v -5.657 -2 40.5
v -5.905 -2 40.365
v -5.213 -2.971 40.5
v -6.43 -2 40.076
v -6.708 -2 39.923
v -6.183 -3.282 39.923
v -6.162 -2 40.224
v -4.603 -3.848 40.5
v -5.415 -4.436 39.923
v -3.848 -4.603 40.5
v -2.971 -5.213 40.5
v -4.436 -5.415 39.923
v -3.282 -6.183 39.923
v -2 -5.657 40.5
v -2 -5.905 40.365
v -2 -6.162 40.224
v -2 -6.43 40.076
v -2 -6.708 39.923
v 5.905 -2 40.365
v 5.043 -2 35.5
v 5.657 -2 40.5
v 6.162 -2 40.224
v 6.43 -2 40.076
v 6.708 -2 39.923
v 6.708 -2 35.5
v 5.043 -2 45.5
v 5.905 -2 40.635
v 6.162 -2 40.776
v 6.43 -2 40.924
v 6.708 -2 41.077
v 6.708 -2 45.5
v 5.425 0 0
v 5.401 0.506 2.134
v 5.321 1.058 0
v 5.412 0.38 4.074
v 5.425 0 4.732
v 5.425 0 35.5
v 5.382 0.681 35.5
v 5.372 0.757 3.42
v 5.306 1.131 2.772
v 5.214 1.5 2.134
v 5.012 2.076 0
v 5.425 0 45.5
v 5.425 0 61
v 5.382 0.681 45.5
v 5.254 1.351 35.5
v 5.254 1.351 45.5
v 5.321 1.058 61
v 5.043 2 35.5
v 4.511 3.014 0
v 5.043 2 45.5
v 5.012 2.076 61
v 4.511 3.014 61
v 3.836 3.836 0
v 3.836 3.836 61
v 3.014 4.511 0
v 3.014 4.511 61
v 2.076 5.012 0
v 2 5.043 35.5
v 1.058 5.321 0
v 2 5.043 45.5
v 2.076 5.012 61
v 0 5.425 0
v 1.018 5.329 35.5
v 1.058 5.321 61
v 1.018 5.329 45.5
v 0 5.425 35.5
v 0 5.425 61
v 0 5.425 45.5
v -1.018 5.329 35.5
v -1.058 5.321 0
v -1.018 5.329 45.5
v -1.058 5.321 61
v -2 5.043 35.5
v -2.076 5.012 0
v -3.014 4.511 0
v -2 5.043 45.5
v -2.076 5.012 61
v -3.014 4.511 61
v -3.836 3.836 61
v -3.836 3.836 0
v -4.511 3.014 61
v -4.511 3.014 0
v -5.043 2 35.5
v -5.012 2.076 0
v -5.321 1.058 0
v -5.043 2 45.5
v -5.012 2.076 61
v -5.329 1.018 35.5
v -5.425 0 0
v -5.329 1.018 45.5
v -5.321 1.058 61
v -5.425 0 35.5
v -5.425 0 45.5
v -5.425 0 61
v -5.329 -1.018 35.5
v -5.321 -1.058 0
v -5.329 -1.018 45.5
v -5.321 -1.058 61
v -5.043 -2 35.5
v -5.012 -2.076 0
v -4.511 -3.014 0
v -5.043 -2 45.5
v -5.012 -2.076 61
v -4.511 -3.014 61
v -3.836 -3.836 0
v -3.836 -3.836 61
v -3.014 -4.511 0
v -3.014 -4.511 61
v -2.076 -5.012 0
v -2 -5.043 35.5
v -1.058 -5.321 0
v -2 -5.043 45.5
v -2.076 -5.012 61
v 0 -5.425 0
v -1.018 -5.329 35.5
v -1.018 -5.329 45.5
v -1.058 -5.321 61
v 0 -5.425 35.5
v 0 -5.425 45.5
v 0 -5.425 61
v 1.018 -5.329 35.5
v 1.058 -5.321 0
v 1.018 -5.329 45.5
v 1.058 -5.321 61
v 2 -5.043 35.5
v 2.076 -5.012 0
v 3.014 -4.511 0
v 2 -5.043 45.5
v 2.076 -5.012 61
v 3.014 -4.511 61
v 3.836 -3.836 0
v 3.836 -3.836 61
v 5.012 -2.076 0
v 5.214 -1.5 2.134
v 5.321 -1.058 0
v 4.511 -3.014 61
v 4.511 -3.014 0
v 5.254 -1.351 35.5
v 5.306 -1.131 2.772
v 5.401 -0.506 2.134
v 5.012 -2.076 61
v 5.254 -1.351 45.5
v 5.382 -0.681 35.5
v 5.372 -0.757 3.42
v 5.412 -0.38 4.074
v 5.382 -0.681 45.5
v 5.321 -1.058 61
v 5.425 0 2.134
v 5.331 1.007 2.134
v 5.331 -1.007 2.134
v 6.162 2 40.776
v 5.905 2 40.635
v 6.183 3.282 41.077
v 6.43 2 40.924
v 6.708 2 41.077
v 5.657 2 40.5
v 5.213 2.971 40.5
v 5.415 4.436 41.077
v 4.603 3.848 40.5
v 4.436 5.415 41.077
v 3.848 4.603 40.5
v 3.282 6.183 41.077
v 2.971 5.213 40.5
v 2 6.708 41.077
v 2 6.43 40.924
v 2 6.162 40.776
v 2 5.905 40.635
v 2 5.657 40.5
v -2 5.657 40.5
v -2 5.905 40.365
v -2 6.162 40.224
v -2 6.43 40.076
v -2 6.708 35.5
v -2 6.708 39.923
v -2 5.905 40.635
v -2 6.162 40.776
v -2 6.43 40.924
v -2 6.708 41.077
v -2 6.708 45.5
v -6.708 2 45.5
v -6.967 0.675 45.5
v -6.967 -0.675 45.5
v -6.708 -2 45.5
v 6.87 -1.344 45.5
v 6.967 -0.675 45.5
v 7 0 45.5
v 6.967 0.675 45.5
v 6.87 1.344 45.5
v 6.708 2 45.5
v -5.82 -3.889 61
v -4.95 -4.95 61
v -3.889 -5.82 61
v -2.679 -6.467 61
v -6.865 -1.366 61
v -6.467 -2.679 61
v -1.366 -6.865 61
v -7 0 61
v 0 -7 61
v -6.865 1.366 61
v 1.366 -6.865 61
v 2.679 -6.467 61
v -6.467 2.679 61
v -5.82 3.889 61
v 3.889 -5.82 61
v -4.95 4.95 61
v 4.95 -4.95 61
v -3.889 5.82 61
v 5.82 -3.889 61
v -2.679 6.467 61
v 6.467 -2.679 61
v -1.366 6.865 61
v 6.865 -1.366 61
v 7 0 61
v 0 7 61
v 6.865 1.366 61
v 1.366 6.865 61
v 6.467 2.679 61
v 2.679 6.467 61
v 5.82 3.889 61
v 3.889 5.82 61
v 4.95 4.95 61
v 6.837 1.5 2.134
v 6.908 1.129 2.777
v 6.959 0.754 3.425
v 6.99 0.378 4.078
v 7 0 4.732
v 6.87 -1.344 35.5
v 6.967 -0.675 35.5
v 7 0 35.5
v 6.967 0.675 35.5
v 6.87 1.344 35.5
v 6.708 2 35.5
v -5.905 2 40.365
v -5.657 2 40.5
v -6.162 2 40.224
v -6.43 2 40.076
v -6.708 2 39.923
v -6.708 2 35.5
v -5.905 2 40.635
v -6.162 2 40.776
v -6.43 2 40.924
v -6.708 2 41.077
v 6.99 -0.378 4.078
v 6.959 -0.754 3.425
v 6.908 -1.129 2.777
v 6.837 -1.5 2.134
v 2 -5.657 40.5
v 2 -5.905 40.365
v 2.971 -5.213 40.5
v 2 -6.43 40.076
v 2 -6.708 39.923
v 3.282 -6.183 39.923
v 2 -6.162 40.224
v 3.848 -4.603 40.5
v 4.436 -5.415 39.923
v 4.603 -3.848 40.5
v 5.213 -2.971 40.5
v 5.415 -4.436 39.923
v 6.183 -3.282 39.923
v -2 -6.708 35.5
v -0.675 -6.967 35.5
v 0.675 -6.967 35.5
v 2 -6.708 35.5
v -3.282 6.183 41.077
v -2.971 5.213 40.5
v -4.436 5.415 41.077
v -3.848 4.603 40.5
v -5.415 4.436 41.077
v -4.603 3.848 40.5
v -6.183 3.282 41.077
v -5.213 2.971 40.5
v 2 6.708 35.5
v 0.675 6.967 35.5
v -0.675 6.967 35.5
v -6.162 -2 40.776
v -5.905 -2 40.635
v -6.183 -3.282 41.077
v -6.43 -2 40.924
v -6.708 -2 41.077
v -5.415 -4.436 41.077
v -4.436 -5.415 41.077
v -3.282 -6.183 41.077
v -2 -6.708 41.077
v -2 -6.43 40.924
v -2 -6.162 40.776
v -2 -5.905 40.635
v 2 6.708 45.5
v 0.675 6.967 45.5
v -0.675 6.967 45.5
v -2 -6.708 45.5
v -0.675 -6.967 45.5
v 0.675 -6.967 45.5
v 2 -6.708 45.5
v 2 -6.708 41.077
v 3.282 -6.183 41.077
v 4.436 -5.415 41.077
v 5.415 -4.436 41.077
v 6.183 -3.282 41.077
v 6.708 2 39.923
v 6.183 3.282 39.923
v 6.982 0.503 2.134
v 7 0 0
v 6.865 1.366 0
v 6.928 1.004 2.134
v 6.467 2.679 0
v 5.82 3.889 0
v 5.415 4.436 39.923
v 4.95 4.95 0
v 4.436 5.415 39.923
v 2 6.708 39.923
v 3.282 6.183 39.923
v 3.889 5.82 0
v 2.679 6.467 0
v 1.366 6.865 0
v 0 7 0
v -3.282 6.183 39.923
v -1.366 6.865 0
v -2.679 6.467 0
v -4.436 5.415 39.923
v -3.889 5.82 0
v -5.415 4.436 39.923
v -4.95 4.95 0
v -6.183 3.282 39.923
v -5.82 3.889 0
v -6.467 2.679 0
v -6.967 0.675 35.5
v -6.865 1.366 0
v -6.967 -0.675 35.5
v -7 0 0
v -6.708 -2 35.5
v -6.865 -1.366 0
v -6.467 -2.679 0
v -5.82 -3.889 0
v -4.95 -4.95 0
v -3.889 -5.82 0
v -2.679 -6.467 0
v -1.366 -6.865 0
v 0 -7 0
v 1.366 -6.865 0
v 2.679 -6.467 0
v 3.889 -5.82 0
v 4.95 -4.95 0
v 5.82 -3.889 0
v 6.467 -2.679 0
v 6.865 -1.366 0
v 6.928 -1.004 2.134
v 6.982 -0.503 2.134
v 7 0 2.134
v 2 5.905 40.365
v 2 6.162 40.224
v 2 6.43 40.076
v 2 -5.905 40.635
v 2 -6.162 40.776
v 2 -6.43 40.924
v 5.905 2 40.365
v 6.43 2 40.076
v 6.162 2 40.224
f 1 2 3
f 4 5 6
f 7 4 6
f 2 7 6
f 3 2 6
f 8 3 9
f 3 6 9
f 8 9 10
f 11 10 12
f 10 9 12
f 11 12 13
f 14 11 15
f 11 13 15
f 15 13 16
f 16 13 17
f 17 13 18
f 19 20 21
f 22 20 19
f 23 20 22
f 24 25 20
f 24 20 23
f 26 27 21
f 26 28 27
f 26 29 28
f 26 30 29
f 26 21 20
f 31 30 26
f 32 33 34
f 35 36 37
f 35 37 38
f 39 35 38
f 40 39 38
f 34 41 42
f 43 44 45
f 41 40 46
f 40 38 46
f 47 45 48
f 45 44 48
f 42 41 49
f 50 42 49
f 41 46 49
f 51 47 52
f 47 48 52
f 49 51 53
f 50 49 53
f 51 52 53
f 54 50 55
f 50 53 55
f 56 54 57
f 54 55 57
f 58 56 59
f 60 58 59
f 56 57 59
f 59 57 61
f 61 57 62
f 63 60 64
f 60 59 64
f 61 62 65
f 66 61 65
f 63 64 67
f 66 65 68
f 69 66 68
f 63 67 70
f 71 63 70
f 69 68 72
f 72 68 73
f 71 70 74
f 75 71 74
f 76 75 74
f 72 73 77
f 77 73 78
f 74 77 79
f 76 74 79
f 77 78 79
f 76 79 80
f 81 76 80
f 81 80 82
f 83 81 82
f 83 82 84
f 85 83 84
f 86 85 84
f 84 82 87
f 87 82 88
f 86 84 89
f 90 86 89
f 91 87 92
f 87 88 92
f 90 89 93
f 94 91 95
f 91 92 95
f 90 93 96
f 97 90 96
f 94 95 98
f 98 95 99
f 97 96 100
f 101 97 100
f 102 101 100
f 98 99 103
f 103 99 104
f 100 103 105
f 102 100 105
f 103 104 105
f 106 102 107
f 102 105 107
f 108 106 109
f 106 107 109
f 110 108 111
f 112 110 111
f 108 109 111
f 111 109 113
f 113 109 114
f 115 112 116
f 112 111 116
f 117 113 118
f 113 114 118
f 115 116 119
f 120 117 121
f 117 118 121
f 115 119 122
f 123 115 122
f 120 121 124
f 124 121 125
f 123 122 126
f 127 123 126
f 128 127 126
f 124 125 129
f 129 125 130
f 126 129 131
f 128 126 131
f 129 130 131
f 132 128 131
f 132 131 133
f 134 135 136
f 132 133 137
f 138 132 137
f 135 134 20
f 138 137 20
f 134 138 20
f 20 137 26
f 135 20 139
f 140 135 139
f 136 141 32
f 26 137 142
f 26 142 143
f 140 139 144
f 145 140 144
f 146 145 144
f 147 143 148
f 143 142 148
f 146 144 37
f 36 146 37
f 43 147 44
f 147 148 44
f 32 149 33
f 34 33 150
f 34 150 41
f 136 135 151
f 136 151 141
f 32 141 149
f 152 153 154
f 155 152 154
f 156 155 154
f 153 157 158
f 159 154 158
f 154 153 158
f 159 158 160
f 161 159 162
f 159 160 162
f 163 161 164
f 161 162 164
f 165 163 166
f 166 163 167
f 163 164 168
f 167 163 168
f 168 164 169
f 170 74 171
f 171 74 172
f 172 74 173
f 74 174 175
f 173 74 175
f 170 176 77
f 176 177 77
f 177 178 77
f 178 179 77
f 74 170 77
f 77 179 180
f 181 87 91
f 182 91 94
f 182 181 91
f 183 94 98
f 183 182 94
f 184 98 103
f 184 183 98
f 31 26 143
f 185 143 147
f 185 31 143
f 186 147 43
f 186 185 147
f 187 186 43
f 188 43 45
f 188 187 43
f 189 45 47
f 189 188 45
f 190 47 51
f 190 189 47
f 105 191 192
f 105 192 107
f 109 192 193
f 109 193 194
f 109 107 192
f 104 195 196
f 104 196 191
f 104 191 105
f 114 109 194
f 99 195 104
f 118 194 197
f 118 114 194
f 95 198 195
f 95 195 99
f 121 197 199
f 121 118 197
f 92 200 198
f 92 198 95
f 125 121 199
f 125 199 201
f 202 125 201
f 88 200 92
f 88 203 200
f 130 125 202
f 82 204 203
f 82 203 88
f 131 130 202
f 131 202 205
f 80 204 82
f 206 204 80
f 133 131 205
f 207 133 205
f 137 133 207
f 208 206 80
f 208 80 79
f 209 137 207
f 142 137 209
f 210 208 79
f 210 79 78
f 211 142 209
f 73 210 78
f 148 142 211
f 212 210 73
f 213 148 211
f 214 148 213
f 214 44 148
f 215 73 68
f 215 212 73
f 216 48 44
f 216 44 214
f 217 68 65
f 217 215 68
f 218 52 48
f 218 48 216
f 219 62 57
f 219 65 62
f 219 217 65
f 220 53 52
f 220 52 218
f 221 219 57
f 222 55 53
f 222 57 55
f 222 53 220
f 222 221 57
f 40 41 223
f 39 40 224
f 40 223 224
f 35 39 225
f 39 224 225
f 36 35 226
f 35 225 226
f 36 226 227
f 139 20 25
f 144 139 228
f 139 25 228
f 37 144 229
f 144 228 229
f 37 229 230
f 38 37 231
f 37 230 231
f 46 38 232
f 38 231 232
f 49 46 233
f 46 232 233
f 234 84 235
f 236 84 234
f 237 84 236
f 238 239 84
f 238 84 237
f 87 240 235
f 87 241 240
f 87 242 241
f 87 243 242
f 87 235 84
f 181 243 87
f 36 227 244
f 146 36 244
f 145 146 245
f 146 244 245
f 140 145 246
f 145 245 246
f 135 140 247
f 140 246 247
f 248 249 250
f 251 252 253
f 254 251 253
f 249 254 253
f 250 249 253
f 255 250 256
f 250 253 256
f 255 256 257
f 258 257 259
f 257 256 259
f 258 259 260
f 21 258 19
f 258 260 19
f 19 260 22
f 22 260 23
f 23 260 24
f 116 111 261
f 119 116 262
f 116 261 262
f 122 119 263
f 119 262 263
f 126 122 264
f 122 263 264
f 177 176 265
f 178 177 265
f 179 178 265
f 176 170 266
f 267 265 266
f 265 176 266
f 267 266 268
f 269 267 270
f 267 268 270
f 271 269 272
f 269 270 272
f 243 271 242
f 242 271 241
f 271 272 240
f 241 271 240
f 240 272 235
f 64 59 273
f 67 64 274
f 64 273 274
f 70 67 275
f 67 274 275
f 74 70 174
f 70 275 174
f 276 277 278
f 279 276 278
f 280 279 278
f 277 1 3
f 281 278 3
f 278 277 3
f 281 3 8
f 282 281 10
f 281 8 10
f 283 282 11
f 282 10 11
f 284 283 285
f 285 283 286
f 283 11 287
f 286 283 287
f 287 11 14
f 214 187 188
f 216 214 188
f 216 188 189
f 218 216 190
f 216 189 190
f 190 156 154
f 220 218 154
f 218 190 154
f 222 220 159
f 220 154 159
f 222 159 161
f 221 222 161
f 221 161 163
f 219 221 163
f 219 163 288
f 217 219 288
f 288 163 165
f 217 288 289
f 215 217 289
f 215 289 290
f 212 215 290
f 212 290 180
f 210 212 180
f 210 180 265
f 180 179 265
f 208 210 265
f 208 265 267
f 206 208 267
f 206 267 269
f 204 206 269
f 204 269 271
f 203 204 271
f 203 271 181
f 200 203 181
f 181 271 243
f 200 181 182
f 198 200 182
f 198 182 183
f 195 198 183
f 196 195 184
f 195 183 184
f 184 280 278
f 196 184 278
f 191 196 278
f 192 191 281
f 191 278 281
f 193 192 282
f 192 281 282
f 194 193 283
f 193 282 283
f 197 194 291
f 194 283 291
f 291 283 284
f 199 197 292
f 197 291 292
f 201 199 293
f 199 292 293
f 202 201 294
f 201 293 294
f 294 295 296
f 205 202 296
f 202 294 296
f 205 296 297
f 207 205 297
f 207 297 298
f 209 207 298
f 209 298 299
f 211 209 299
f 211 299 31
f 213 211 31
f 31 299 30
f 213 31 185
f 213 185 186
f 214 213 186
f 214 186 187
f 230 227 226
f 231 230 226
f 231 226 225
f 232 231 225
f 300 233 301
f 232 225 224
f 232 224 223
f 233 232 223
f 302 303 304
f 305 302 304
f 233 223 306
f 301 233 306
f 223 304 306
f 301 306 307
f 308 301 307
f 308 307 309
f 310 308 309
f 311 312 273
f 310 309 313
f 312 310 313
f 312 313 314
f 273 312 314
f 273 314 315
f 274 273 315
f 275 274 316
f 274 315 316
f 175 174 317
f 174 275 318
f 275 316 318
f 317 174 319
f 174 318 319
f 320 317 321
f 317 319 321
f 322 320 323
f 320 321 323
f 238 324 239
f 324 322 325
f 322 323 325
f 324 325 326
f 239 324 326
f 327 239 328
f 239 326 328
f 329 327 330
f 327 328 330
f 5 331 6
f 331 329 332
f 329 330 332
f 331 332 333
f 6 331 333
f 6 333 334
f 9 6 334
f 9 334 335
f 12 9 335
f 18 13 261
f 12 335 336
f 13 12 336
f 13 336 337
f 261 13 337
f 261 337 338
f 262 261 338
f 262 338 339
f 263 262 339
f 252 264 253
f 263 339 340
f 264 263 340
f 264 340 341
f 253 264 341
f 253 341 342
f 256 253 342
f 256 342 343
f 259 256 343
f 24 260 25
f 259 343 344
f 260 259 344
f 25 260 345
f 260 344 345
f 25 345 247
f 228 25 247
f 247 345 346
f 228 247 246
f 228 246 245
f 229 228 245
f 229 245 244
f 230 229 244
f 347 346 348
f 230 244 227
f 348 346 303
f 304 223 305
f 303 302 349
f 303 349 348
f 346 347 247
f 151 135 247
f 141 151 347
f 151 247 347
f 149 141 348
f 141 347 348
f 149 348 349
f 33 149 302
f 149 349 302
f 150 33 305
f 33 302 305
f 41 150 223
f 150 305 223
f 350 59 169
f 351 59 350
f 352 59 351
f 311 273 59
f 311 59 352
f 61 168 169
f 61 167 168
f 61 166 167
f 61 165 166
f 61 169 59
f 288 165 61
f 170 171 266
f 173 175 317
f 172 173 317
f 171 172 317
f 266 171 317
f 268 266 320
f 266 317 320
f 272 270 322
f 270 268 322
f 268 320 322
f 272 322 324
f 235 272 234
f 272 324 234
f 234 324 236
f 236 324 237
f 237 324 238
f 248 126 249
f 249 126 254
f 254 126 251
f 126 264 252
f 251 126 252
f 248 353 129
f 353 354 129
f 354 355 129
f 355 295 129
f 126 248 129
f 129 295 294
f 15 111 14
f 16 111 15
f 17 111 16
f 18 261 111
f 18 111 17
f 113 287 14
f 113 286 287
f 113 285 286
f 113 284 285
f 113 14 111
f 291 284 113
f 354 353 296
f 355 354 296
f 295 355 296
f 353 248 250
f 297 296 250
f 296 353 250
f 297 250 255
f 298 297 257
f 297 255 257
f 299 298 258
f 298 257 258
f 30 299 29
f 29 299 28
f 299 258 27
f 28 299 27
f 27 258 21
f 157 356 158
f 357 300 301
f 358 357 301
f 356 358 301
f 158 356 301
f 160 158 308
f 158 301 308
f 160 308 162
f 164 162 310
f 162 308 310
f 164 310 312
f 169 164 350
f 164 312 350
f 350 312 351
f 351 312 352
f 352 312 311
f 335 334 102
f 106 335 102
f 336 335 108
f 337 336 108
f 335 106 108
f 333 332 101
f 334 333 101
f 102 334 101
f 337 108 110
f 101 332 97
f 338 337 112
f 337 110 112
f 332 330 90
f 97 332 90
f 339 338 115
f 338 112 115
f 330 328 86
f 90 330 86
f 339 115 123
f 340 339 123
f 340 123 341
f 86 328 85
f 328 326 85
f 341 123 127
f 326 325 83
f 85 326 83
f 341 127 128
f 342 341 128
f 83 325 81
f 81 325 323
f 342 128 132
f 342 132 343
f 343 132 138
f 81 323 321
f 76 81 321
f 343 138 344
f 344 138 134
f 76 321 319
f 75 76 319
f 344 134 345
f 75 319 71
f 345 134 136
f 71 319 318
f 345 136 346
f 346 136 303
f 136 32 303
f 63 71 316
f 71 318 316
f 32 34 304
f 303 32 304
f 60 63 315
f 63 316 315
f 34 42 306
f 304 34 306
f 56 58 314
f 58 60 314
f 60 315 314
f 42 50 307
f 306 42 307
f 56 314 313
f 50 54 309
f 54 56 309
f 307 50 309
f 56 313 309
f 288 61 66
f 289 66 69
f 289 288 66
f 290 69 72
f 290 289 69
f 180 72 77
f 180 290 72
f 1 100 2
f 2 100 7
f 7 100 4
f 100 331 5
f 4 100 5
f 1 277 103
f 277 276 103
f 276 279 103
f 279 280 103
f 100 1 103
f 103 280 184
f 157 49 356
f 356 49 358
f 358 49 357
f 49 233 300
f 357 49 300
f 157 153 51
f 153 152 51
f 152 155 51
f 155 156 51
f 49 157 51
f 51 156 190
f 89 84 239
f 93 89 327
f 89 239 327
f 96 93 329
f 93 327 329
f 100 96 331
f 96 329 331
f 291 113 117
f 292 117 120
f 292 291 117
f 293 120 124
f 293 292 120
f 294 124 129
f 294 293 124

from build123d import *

# Parameters (mm, degrees)
SKETCH_R           = 7
PAD_DEPTH          = 61
SKETCH001_R        = 5.425
POCKET_DEPTH       = 61.001
POCKET001_DEPTH    = 5
SKETCH004_W        = 4
SKETCH004_H        = 10
POCKET002_DEPTH    = 5
POLARPATTERN_COUNT = 4


with BuildPart() as part:
    # Sketch → Pad (new body)
    with BuildSketch(Plane.XY):
        Circle(SKETCH_R)
    extrude(amount=PAD_DEPTH)

    # Sketch001 (on Face3 of Pad) → Pocket (cut, through all)
    with BuildSketch(Plane.XY.offset(61)):
        Circle(SKETCH001_R)
    extrude(amount=-POCKET_DEPTH, mode=Mode.SUBTRACT)

    # Sketch002 (on DatumPlane) → Groove (revolve, cut)
    with BuildSketch(Plane(origin=(0, 0, 30.5), x_dir=(0, 0, -1), z_dir=(1, 0, 0))):
        Polygon((-8.25, 9.031089), (-11.75, 9.031089), (-10, 6), align=None)
    revolve(axis=Axis((0, 0, 0), (0, 0, 1)), mode=Mode.SUBTRACT)

    # Sketch003 (on DatumPlane) → Pocket001 (cut)
    with BuildSketch(Plane.YZ.offset(7)):
        Polygon((0, 4.732051), (-1.5, 2.133975), (1.5, 2.133975), align=None)
    extrude(amount=-POCKET001_DEPTH, mode=Mode.SUBTRACT)

    # Sketch004 (on DatumPlane) → Pocket002 (cut)
    with BuildSketch(Plane.YZ.offset(7)):
        with Locations((0, 40.5)):
            Rectangle(SKETCH004_W, SKETCH004_H)
    pocket002 = extrude(amount=-POCKET002_DEPTH, mode=Mode.SUBTRACT)

    # PolarPattern: Pocket002 ×4 about axis
    polarpattern_axis = Axis((0, 0, 0), (0, 0, 1))
    for i in range(1, POLARPATTERN_COUNT):
        add(pocket002.rotate(polarpattern_axis, i * 360 / POLARPATTERN_COUNT), mode=Mode.SUBTRACT)


solid = part.part
